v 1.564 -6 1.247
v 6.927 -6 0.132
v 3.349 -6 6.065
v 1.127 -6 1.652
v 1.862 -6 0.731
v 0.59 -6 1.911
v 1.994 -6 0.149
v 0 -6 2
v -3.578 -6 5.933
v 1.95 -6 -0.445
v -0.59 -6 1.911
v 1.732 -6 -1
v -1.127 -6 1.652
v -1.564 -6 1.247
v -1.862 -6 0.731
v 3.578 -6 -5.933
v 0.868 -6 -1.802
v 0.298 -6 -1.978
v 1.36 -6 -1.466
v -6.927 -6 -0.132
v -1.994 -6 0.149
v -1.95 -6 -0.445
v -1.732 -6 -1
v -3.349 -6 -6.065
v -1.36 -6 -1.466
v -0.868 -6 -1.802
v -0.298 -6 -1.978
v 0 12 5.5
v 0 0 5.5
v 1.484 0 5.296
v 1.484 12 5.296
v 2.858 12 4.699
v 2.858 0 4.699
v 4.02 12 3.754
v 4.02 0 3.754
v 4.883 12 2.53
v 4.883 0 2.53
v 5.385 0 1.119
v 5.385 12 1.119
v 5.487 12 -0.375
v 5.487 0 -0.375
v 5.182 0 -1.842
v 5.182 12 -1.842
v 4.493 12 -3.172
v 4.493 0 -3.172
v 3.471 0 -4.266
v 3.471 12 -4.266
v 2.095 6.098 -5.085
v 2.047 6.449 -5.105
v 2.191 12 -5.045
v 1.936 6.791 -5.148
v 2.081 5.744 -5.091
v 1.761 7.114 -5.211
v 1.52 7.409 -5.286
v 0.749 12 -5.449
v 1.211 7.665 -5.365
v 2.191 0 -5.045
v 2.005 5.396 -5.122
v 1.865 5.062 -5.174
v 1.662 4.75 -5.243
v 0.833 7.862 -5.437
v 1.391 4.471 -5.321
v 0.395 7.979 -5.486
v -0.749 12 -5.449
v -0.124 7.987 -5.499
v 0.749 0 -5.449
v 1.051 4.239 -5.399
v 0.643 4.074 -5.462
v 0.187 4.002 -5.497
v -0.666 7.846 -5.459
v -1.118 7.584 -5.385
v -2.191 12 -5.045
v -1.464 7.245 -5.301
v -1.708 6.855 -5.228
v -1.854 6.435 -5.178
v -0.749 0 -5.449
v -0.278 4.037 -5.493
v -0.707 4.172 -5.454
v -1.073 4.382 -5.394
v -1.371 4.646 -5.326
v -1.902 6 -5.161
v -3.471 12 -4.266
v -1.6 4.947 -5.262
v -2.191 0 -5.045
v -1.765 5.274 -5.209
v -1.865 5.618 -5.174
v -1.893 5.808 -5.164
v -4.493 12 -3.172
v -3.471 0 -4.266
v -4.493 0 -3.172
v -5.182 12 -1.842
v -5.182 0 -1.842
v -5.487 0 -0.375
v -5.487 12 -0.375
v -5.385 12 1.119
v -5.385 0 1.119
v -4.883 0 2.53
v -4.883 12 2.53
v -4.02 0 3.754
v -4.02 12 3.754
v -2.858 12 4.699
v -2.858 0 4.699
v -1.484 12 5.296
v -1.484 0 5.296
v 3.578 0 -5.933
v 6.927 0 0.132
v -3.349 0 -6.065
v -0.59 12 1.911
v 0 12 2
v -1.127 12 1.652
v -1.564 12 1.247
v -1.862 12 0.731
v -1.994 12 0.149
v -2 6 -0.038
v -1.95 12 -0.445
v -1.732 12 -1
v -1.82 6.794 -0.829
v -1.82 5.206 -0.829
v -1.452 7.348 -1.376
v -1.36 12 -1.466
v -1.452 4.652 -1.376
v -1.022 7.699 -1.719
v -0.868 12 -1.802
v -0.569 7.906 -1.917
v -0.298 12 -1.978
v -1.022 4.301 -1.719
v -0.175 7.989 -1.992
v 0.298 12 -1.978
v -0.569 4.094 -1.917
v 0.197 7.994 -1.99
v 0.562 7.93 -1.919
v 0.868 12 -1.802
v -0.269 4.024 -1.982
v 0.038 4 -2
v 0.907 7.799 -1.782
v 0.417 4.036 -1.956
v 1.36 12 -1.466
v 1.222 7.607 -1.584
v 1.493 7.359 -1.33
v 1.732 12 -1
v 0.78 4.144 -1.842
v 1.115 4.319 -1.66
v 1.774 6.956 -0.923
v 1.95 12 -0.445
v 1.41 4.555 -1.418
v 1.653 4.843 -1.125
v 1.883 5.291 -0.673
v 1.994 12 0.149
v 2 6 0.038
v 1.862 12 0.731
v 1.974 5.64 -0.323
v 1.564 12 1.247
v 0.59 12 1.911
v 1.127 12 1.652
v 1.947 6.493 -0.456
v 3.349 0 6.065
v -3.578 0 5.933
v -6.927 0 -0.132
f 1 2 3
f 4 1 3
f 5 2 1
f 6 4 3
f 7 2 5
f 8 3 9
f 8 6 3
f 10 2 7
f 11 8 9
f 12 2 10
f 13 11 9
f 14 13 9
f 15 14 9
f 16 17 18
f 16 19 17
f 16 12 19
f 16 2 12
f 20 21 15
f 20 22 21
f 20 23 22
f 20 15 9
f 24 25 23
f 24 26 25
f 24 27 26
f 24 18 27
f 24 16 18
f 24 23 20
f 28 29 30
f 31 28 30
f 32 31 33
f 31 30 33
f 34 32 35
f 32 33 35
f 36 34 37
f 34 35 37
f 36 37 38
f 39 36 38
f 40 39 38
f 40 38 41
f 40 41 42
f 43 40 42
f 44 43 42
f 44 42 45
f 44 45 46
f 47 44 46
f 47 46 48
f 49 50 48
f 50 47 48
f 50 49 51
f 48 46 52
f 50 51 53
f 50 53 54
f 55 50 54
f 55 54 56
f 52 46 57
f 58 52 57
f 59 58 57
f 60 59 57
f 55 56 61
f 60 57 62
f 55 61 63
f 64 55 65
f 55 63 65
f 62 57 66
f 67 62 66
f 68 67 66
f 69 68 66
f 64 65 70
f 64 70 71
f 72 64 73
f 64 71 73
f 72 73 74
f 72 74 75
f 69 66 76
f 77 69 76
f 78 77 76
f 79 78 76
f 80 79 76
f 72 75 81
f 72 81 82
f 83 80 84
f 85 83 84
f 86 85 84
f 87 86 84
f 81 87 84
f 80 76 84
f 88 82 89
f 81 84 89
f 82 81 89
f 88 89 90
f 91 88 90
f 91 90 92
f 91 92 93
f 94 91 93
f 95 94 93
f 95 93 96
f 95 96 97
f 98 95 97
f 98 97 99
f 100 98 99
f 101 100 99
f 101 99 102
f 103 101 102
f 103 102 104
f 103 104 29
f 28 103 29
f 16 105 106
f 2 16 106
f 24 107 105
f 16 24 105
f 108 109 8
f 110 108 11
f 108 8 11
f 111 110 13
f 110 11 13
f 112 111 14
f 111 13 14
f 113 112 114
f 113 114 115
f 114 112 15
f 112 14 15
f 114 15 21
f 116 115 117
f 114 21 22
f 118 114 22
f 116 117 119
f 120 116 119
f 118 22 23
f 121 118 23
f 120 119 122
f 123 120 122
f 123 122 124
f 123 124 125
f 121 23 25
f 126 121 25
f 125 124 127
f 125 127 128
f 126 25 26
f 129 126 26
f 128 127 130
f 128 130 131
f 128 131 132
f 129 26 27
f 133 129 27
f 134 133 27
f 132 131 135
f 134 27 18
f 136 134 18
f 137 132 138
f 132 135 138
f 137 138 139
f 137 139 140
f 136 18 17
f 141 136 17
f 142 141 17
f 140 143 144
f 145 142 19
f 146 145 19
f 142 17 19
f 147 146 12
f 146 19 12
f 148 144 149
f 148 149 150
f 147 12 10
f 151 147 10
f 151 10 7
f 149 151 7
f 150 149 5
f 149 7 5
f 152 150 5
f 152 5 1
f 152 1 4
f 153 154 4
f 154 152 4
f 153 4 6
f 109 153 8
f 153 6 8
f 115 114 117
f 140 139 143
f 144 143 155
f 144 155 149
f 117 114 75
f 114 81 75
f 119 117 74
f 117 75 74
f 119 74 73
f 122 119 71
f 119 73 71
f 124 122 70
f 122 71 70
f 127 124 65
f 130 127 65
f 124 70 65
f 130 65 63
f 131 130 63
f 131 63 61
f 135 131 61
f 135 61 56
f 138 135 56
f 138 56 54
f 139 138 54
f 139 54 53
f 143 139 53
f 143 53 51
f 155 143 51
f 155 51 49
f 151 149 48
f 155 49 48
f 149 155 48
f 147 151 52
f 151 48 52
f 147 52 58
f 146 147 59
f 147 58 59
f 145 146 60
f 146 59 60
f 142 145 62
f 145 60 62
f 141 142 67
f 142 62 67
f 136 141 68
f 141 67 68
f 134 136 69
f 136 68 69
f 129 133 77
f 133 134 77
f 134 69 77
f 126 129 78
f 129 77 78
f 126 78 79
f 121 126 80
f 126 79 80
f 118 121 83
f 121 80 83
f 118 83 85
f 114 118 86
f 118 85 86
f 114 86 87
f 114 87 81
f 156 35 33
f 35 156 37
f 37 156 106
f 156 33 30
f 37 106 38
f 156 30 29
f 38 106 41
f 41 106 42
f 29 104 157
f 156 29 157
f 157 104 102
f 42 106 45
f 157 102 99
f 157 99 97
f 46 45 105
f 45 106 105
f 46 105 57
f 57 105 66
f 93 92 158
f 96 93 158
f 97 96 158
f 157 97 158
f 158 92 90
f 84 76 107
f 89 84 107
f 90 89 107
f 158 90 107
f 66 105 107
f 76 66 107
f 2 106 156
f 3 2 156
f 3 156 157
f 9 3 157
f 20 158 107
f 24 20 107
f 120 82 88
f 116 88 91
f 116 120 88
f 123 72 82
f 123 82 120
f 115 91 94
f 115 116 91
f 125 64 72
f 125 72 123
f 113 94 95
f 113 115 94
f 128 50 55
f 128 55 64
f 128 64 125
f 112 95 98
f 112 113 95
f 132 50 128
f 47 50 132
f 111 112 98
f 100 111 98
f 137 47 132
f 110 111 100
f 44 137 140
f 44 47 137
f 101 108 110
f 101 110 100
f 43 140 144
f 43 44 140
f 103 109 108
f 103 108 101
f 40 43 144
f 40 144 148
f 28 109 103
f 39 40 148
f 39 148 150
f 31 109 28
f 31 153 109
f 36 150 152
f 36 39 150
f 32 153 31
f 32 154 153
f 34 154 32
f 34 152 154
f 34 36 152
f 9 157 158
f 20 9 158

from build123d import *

# Parameters (mm, degrees)
SKETCH_1_R          = 5.5
EXTRUDE_1_DEPTH     = 12
SKETCH_2_R          = 2
CUT_EXTRUDE_1_DEPTH = 12
EXTRUDE_2_DEPTH     = 6
SKETCH_4_R          = 2
CUT_EXTRUDE_2_DEPTH = 21.217986778
SKETCH_5_R          = 2
CUT_EXTRUDE_3_DEPTH = 6


with BuildPart() as part:
    # 草图1 → 凸台-拉伸1 (new body)
    with BuildSketch(Plane(origin=(0, 0, 0), x_dir=(1, 0, 0), z_dir=(0, 1, 0))):
        with Locations(Location((0, 0, 0), (0, 0, 270))):
            Circle(SKETCH_1_R)
    extrude(amount=EXTRUDE_1_DEPTH)

    # 草图2 → 切除-拉伸1 (cut)
    with BuildSketch(Plane(origin=(0, 12, 0), x_dir=(1, 0, 0), z_dir=(0, 1, 0))):
        with Locations(Location((0, 0, 0), (0, 0, 270))):
            Circle(SKETCH_2_R)
    extrude(amount=-CUT_EXTRUDE_1_DEPTH, mode=Mode.SUBTRACT)

    # 草图3 → 凸台-拉伸2 (add)
    with BuildSketch(Plane(origin=(0, 0, 0), x_dir=(-1, 0, 0), z_dir=(0, -1, 0))):
        Polygon((3.577982267, -5.932793852), (6.926941325, 0.132226612), (3.348959058, 6.065020464), (-3.577982267, 5.932793852), (-6.926941325, -0.132226612), (-3.348959058, -6.065020464), align=None)
    extrude(amount=EXTRUDE_2_DEPTH)

    # 草图4 → 切除-拉伸2 (cut, through all)
    with BuildSketch(Plane.XZ.offset(6)):
        with Locations(Location((0, 0, 0), (0, 0, 90))):
            Circle(SKETCH_4_R)
    extrude(amount=-CUT_EXTRUDE_2_DEPTH, mode=Mode.SUBTRACT)

    # 草图5 → 切除-拉伸3 (cut)
    with BuildSketch(Plane(origin=(0.114511605, 0, -5.998907158), x_dir=(-0.9998178596958822, 0, -0.019085267437092362), z_dir=(0.01908526743709236, 0, -0.9998178596958821))):
        with Locations((0, 6)):
            Circle(SKETCH_5_R)
    extrude(amount=-CUT_EXTRUDE_3_DEPTH, mode=Mode.SUBTRACT)


solid = part.part
